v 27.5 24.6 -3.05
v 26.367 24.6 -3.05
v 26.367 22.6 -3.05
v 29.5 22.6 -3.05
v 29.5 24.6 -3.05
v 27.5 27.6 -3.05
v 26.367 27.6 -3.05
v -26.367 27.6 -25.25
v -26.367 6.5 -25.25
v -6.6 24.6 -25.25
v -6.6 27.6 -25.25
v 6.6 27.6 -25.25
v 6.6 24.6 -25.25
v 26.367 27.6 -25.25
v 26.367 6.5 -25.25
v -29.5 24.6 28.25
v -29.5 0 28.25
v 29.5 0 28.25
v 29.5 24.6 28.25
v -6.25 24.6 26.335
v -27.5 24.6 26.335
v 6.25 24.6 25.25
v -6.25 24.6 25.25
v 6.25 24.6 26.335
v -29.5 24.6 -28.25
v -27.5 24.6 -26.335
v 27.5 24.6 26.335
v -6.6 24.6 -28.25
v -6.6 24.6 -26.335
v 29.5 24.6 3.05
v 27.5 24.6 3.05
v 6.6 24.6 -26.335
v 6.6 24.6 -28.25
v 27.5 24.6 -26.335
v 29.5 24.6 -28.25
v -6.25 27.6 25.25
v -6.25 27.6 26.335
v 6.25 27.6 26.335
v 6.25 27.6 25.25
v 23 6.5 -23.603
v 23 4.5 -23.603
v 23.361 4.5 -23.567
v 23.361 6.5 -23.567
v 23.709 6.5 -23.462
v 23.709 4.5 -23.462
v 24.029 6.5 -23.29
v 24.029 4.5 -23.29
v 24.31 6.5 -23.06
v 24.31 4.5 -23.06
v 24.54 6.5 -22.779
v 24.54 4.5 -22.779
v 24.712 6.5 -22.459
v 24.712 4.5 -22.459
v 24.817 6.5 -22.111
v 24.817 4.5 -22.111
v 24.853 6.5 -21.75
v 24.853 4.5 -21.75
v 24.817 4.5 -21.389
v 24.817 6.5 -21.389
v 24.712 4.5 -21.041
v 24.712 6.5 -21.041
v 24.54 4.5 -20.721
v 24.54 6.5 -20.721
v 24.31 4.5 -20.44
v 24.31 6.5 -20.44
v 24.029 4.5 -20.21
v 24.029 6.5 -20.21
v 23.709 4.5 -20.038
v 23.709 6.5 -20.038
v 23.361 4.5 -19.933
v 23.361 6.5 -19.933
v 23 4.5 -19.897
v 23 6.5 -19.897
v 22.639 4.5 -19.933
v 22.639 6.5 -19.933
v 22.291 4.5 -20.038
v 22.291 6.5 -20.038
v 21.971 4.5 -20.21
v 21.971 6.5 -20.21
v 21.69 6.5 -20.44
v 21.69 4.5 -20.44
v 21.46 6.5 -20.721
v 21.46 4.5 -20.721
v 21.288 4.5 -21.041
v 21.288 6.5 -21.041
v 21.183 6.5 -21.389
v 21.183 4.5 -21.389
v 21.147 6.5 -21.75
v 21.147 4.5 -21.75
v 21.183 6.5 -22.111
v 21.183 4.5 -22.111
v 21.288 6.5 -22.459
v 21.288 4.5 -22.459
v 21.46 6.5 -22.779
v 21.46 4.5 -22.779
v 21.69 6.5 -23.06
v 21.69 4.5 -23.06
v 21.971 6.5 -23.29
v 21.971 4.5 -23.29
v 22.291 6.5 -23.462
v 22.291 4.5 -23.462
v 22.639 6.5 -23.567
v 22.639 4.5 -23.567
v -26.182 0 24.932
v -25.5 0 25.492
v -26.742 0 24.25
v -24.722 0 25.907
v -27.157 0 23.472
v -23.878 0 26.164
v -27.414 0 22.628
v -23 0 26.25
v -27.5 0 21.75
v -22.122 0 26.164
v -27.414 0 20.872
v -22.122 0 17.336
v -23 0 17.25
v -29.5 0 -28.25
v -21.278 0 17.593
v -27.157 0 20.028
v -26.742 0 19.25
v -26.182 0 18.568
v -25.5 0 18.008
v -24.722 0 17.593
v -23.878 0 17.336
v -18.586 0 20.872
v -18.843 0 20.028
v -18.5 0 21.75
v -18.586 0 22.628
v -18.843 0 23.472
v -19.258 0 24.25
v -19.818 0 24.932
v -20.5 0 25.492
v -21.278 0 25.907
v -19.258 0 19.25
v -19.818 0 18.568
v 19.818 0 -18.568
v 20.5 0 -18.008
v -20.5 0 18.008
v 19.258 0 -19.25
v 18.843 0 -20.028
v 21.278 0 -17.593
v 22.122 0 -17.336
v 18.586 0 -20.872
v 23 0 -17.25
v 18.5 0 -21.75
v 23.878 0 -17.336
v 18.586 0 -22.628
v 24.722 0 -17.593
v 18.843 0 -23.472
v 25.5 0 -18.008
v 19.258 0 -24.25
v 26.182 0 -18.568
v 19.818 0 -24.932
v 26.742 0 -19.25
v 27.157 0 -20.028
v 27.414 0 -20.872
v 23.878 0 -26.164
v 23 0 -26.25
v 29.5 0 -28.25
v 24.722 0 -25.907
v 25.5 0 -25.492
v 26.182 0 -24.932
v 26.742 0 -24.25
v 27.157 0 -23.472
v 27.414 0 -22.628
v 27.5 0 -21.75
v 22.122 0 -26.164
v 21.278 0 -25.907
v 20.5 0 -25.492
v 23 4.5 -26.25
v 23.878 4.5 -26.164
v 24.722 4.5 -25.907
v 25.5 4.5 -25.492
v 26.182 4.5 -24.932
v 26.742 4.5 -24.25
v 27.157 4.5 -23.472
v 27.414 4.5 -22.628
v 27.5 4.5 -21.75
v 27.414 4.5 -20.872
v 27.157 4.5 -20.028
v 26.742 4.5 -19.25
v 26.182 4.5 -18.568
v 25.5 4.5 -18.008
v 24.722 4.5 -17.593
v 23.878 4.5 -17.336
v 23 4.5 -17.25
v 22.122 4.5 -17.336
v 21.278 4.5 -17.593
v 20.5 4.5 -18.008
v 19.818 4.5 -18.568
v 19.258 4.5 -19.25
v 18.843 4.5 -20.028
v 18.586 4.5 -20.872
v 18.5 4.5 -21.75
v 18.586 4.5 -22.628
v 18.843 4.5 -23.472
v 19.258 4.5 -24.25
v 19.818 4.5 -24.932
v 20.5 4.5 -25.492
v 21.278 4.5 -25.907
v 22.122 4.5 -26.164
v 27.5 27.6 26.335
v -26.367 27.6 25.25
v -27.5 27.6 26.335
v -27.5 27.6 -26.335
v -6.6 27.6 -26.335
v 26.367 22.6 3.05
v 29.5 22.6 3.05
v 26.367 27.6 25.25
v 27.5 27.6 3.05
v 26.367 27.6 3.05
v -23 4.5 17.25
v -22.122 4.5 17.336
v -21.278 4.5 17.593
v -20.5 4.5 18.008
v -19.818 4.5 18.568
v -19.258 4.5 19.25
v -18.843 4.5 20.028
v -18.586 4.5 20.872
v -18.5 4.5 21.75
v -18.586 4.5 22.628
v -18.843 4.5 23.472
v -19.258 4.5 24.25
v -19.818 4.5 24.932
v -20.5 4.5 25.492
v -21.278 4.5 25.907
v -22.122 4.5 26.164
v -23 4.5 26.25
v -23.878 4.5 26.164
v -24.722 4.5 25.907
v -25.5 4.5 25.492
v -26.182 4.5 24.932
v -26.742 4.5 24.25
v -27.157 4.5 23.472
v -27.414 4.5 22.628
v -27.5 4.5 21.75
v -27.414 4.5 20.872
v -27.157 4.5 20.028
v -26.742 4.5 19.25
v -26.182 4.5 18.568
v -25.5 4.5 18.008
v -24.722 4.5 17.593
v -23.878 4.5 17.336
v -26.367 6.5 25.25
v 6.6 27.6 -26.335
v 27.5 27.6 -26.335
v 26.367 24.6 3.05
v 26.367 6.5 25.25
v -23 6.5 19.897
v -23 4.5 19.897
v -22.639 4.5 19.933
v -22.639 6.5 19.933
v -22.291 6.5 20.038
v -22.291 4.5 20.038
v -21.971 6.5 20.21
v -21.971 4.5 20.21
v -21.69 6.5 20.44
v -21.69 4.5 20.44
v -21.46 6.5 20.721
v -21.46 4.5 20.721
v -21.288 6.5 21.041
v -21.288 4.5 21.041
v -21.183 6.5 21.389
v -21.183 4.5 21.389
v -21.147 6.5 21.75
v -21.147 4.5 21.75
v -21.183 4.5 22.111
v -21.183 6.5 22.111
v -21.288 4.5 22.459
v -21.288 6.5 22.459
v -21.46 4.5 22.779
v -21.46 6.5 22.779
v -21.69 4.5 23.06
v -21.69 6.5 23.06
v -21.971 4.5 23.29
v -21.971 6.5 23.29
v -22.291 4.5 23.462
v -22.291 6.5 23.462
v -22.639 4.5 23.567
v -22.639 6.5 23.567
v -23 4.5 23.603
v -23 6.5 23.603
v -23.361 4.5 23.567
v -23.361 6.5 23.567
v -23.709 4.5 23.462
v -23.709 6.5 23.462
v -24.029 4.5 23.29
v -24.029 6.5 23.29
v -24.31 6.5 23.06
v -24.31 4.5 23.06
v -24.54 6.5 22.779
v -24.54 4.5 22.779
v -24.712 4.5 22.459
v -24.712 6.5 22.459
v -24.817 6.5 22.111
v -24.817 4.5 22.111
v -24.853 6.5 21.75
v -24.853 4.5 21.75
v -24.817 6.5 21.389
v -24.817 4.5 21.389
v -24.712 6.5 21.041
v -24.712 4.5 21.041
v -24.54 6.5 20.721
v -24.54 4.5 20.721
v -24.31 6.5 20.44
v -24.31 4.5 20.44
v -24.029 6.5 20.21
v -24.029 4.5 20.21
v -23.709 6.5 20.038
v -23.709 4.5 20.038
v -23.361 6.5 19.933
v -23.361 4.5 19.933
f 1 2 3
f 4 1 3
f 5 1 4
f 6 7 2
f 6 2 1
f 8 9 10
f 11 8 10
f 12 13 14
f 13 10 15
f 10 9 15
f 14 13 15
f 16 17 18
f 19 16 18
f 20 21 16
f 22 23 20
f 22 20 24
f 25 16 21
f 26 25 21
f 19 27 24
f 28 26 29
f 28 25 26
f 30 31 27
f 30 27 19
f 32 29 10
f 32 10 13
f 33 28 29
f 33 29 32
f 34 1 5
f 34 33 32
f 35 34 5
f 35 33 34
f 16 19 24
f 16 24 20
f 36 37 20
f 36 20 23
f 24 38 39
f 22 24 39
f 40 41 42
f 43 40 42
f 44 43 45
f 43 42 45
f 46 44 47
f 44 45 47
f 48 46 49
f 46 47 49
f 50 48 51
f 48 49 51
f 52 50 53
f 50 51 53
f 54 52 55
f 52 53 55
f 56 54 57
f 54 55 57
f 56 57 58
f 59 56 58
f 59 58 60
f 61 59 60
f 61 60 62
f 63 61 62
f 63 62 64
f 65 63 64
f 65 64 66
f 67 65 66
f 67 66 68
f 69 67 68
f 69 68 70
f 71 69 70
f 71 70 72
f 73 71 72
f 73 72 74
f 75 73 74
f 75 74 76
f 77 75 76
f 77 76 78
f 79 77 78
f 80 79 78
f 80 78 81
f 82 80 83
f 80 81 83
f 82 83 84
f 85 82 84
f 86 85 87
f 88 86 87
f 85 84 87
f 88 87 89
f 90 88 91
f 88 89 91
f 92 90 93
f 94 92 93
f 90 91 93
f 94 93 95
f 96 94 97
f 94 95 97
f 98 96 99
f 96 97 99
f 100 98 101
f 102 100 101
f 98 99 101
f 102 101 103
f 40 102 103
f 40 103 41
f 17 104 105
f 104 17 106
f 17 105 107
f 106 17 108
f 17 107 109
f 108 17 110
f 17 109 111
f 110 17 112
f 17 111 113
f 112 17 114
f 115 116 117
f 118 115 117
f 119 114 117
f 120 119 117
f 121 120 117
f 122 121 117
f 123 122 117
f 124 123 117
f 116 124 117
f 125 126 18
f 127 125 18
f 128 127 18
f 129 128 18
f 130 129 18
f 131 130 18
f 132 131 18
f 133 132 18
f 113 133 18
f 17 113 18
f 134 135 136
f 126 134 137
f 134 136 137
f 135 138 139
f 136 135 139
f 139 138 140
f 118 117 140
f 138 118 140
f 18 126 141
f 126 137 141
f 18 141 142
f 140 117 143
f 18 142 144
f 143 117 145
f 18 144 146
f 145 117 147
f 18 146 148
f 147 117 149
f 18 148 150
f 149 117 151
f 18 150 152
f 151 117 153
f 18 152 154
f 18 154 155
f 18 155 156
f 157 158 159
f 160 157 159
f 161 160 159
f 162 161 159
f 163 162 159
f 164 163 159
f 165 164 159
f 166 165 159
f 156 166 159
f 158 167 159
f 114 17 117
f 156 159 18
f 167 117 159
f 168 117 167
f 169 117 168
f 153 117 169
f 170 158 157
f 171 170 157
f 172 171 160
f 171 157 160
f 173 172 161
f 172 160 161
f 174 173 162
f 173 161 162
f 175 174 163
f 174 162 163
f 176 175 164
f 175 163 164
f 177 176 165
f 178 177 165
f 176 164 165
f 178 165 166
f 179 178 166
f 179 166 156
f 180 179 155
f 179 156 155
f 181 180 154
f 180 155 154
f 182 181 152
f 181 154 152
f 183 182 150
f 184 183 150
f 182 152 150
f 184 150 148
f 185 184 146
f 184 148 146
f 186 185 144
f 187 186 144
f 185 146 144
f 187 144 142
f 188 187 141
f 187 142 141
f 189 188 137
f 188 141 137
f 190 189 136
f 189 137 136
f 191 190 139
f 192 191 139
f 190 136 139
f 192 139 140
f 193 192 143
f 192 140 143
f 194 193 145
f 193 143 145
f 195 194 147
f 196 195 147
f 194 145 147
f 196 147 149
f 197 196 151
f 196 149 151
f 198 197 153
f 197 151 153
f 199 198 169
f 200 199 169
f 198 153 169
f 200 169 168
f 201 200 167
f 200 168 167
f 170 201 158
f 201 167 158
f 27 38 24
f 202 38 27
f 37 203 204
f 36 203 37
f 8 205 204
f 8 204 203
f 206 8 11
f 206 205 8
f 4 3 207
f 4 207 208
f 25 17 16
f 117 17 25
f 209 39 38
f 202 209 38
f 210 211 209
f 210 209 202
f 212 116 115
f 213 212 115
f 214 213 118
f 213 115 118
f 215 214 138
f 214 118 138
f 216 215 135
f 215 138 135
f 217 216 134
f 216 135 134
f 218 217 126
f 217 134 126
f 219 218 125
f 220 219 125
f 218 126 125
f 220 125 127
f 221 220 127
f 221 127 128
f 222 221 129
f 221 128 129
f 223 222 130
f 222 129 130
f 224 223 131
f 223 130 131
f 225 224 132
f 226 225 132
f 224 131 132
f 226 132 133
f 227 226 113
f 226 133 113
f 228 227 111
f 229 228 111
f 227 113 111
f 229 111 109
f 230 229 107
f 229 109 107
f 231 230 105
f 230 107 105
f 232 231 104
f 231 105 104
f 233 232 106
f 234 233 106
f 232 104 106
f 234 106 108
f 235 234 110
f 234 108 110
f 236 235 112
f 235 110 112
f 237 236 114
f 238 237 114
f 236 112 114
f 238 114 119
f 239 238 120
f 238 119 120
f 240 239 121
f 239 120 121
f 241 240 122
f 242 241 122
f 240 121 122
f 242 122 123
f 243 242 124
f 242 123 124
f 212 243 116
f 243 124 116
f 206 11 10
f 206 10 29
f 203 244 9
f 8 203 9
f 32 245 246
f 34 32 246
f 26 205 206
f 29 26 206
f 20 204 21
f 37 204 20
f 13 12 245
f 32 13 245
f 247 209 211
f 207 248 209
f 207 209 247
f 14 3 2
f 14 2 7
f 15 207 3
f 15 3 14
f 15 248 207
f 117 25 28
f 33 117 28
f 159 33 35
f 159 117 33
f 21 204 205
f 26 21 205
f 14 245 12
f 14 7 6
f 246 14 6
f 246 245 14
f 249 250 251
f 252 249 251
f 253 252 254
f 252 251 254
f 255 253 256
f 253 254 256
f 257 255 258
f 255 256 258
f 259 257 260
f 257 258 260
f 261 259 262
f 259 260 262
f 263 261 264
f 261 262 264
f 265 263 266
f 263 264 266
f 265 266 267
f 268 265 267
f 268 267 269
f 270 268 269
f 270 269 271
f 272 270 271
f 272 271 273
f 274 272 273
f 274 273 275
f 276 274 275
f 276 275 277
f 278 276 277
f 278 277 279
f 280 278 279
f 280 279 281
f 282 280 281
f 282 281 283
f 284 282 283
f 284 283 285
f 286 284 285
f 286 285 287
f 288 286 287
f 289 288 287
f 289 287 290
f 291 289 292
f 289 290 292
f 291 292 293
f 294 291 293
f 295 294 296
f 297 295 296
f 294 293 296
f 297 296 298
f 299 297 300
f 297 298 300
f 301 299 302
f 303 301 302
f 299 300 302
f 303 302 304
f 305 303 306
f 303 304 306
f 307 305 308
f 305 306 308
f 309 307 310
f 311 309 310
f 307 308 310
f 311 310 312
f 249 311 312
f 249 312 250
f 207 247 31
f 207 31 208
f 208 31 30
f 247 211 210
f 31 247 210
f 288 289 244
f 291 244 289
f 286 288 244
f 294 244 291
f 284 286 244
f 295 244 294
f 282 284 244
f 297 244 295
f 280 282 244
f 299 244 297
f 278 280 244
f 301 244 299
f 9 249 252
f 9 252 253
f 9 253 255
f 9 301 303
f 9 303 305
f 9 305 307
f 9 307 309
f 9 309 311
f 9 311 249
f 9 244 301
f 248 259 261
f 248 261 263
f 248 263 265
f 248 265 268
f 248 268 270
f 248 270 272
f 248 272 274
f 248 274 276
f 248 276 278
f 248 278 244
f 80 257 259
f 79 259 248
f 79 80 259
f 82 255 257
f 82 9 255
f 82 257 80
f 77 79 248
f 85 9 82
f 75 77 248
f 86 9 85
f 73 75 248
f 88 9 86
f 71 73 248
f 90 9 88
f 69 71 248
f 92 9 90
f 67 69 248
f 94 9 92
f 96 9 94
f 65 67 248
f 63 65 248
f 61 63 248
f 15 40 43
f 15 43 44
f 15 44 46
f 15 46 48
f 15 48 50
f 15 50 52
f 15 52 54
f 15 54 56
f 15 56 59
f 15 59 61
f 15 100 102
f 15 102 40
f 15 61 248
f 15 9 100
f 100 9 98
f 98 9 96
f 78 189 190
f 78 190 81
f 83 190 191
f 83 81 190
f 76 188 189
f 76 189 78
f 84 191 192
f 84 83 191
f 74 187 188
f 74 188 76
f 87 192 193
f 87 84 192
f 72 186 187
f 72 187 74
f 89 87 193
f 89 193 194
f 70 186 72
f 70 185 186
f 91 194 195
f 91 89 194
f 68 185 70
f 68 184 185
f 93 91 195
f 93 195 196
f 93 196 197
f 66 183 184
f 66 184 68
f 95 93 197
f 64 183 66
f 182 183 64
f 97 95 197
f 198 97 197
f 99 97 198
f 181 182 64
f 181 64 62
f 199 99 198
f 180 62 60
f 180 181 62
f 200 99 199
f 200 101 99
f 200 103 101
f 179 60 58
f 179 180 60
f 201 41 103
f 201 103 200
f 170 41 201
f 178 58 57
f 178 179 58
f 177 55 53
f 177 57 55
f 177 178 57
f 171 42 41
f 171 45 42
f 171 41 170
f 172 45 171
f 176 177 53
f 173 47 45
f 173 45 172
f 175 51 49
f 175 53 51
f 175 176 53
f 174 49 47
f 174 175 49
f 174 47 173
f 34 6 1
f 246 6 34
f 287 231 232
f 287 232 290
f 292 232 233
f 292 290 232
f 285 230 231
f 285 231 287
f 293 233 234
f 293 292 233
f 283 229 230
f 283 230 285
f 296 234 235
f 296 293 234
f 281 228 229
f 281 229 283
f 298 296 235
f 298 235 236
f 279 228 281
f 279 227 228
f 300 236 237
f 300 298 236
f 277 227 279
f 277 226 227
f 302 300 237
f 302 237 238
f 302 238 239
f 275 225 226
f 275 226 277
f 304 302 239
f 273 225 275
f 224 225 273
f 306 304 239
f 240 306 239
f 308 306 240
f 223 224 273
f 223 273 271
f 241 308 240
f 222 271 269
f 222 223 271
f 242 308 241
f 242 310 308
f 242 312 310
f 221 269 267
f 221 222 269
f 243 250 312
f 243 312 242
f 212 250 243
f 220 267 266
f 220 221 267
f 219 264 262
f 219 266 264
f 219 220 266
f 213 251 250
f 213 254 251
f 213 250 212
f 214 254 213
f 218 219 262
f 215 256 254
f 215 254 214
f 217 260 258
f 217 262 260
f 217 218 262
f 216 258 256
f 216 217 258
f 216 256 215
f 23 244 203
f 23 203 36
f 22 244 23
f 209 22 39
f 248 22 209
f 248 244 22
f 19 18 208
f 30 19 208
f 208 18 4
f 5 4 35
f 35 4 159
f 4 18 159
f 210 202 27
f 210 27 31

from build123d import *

# Parameters (mm, degrees)
SKETCH1_W           = 59
SKETCH1_H           = 56.5
BOSS_EXTRUDE1_DEPTH = 6.5
SKETCH5_W           = 59
SKETCH5_H           = 56.5
SKETCH5_W_2         = 52.734513274
SKETCH5_H_2         = 50.5
BOSS_EXTRUDE2_DEPTH = 21.1
SKETCH6_W           = 59
SKETCH6_H           = 56.5
SKETCH6_W_2         = 55
SKETCH6_H_2         = 52.669491526
CUT_EXTRUDE2_DEPTH  = 3
SKETCH7_W           = 12.5
SKETCH7_H           = 2.169491525
SKETCH7_W_2         = 13.2
SKETCH7_H_2         = 3.830508475
SKETCH7_W_3         = 2.265486726
SKETCH7_H_3         = 6.1
CUT_EXTRUDE3_DEPTH  = 3
SKETCH9_W           = 3.132743363
SKETCH9_H           = 6.1
CUT_EXTRUDE5_DEPTH  = 2
SKETCH11_R          = 1.8526
CUT_EXTRUDE7_DEPTH  = 10
SKETCH12_R          = 4.5
CUT_EXTRUDE8_DEPTH  = 4.5


with BuildPart() as part:
    # Sketch1 → Boss-Extrude1 (new body)
    with BuildSketch(Plane(origin=(0, 0, 0), x_dir=(1, 0, 0), z_dir=(0, 1, 0))):
        Rectangle(SKETCH1_W, SKETCH1_H)
    extrude(amount=BOSS_EXTRUDE1_DEPTH)

    # Sketch5 → Boss-Extrude2 (add)
    with BuildSketch(Plane(origin=(0, 6.5, 0), x_dir=(1, 0, 0), z_dir=(0, 1, 0))):
        Rectangle(SKETCH5_W, SKETCH5_H)
        Rectangle(SKETCH5_W_2, SKETCH5_H_2, mode=Mode.SUBTRACT)
    extrude(amount=BOSS_EXTRUDE2_DEPTH)

    # Sketch6 → Cut-Extrude2 (cut)
    with BuildSketch(Plane(origin=(0, 27.6, 0), x_dir=(1, 0, 0), z_dir=(0, 1, 0))):
        Rectangle(SKETCH6_W, SKETCH6_H)
        Rectangle(SKETCH6_W_2, SKETCH6_H_2, mode=Mode.SUBTRACT)
    extrude(amount=-CUT_EXTRUDE2_DEPTH, mode=Mode.SUBTRACT)

    # Sketch7 → Cut-Extrude3 (cut)
    with BuildSketch(Plane(origin=(0, 27.6, 0), x_dir=(1, 0, 0), z_dir=(0, 1, 0))):
        with Locations((0, -26.334745762)):
            Rectangle(SKETCH7_W, SKETCH7_H)
        with Locations((0, 26.334745762)):
            Rectangle(SKETCH7_W_2, SKETCH7_H_2)
        with Locations((26.367256637, 0)):
            Rectangle(SKETCH7_W_3, SKETCH7_H_3)
    extrude(amount=-CUT_EXTRUDE3_DEPTH, mode=Mode.SUBTRACT)

    # Sketch9 → Cut-Extrude5 (cut)
    with BuildSketch(Plane(origin=(0, 24.6, 0), x_dir=(1, 0, 0), z_dir=(0, 1, 0))):
        with Locations((27.933628319, 0)):
            Rectangle(SKETCH9_W, SKETCH9_H)
    extrude(amount=-CUT_EXTRUDE5_DEPTH, mode=Mode.SUBTRACT)

    # Sketch11 → Cut-Extrude7 (cut)
    with BuildSketch(Plane(origin=(0, 0, 0), x_dir=(-1, 0, 0), z_dir=(0, -1, 0))):
        with Locations(Location((-23, 21.75, 0), (0, 0, 90))):
            Circle(SKETCH11_R)
        with Locations(Location((23, -21.75, 0), (0, 0, 90))):
            Circle(SKETCH11_R)
    extrude(amount=-CUT_EXTRUDE7_DEPTH, mode=Mode.SUBTRACT)

    # Sketch12 → Cut-Extrude8 (cut)
    with BuildSketch(Plane.XZ):
        with Locations(Location((-23, 21.75, 0), (0, 0, 270))):
            Circle(SKETCH12_R)
        with Locations(Location((23, -21.75, 0), (0, 0, 270))):
            Circle(SKETCH12_R)
    extrude(amount=-CUT_EXTRUDE8_DEPTH, mode=Mode.SUBTRACT)


solid = part.part
